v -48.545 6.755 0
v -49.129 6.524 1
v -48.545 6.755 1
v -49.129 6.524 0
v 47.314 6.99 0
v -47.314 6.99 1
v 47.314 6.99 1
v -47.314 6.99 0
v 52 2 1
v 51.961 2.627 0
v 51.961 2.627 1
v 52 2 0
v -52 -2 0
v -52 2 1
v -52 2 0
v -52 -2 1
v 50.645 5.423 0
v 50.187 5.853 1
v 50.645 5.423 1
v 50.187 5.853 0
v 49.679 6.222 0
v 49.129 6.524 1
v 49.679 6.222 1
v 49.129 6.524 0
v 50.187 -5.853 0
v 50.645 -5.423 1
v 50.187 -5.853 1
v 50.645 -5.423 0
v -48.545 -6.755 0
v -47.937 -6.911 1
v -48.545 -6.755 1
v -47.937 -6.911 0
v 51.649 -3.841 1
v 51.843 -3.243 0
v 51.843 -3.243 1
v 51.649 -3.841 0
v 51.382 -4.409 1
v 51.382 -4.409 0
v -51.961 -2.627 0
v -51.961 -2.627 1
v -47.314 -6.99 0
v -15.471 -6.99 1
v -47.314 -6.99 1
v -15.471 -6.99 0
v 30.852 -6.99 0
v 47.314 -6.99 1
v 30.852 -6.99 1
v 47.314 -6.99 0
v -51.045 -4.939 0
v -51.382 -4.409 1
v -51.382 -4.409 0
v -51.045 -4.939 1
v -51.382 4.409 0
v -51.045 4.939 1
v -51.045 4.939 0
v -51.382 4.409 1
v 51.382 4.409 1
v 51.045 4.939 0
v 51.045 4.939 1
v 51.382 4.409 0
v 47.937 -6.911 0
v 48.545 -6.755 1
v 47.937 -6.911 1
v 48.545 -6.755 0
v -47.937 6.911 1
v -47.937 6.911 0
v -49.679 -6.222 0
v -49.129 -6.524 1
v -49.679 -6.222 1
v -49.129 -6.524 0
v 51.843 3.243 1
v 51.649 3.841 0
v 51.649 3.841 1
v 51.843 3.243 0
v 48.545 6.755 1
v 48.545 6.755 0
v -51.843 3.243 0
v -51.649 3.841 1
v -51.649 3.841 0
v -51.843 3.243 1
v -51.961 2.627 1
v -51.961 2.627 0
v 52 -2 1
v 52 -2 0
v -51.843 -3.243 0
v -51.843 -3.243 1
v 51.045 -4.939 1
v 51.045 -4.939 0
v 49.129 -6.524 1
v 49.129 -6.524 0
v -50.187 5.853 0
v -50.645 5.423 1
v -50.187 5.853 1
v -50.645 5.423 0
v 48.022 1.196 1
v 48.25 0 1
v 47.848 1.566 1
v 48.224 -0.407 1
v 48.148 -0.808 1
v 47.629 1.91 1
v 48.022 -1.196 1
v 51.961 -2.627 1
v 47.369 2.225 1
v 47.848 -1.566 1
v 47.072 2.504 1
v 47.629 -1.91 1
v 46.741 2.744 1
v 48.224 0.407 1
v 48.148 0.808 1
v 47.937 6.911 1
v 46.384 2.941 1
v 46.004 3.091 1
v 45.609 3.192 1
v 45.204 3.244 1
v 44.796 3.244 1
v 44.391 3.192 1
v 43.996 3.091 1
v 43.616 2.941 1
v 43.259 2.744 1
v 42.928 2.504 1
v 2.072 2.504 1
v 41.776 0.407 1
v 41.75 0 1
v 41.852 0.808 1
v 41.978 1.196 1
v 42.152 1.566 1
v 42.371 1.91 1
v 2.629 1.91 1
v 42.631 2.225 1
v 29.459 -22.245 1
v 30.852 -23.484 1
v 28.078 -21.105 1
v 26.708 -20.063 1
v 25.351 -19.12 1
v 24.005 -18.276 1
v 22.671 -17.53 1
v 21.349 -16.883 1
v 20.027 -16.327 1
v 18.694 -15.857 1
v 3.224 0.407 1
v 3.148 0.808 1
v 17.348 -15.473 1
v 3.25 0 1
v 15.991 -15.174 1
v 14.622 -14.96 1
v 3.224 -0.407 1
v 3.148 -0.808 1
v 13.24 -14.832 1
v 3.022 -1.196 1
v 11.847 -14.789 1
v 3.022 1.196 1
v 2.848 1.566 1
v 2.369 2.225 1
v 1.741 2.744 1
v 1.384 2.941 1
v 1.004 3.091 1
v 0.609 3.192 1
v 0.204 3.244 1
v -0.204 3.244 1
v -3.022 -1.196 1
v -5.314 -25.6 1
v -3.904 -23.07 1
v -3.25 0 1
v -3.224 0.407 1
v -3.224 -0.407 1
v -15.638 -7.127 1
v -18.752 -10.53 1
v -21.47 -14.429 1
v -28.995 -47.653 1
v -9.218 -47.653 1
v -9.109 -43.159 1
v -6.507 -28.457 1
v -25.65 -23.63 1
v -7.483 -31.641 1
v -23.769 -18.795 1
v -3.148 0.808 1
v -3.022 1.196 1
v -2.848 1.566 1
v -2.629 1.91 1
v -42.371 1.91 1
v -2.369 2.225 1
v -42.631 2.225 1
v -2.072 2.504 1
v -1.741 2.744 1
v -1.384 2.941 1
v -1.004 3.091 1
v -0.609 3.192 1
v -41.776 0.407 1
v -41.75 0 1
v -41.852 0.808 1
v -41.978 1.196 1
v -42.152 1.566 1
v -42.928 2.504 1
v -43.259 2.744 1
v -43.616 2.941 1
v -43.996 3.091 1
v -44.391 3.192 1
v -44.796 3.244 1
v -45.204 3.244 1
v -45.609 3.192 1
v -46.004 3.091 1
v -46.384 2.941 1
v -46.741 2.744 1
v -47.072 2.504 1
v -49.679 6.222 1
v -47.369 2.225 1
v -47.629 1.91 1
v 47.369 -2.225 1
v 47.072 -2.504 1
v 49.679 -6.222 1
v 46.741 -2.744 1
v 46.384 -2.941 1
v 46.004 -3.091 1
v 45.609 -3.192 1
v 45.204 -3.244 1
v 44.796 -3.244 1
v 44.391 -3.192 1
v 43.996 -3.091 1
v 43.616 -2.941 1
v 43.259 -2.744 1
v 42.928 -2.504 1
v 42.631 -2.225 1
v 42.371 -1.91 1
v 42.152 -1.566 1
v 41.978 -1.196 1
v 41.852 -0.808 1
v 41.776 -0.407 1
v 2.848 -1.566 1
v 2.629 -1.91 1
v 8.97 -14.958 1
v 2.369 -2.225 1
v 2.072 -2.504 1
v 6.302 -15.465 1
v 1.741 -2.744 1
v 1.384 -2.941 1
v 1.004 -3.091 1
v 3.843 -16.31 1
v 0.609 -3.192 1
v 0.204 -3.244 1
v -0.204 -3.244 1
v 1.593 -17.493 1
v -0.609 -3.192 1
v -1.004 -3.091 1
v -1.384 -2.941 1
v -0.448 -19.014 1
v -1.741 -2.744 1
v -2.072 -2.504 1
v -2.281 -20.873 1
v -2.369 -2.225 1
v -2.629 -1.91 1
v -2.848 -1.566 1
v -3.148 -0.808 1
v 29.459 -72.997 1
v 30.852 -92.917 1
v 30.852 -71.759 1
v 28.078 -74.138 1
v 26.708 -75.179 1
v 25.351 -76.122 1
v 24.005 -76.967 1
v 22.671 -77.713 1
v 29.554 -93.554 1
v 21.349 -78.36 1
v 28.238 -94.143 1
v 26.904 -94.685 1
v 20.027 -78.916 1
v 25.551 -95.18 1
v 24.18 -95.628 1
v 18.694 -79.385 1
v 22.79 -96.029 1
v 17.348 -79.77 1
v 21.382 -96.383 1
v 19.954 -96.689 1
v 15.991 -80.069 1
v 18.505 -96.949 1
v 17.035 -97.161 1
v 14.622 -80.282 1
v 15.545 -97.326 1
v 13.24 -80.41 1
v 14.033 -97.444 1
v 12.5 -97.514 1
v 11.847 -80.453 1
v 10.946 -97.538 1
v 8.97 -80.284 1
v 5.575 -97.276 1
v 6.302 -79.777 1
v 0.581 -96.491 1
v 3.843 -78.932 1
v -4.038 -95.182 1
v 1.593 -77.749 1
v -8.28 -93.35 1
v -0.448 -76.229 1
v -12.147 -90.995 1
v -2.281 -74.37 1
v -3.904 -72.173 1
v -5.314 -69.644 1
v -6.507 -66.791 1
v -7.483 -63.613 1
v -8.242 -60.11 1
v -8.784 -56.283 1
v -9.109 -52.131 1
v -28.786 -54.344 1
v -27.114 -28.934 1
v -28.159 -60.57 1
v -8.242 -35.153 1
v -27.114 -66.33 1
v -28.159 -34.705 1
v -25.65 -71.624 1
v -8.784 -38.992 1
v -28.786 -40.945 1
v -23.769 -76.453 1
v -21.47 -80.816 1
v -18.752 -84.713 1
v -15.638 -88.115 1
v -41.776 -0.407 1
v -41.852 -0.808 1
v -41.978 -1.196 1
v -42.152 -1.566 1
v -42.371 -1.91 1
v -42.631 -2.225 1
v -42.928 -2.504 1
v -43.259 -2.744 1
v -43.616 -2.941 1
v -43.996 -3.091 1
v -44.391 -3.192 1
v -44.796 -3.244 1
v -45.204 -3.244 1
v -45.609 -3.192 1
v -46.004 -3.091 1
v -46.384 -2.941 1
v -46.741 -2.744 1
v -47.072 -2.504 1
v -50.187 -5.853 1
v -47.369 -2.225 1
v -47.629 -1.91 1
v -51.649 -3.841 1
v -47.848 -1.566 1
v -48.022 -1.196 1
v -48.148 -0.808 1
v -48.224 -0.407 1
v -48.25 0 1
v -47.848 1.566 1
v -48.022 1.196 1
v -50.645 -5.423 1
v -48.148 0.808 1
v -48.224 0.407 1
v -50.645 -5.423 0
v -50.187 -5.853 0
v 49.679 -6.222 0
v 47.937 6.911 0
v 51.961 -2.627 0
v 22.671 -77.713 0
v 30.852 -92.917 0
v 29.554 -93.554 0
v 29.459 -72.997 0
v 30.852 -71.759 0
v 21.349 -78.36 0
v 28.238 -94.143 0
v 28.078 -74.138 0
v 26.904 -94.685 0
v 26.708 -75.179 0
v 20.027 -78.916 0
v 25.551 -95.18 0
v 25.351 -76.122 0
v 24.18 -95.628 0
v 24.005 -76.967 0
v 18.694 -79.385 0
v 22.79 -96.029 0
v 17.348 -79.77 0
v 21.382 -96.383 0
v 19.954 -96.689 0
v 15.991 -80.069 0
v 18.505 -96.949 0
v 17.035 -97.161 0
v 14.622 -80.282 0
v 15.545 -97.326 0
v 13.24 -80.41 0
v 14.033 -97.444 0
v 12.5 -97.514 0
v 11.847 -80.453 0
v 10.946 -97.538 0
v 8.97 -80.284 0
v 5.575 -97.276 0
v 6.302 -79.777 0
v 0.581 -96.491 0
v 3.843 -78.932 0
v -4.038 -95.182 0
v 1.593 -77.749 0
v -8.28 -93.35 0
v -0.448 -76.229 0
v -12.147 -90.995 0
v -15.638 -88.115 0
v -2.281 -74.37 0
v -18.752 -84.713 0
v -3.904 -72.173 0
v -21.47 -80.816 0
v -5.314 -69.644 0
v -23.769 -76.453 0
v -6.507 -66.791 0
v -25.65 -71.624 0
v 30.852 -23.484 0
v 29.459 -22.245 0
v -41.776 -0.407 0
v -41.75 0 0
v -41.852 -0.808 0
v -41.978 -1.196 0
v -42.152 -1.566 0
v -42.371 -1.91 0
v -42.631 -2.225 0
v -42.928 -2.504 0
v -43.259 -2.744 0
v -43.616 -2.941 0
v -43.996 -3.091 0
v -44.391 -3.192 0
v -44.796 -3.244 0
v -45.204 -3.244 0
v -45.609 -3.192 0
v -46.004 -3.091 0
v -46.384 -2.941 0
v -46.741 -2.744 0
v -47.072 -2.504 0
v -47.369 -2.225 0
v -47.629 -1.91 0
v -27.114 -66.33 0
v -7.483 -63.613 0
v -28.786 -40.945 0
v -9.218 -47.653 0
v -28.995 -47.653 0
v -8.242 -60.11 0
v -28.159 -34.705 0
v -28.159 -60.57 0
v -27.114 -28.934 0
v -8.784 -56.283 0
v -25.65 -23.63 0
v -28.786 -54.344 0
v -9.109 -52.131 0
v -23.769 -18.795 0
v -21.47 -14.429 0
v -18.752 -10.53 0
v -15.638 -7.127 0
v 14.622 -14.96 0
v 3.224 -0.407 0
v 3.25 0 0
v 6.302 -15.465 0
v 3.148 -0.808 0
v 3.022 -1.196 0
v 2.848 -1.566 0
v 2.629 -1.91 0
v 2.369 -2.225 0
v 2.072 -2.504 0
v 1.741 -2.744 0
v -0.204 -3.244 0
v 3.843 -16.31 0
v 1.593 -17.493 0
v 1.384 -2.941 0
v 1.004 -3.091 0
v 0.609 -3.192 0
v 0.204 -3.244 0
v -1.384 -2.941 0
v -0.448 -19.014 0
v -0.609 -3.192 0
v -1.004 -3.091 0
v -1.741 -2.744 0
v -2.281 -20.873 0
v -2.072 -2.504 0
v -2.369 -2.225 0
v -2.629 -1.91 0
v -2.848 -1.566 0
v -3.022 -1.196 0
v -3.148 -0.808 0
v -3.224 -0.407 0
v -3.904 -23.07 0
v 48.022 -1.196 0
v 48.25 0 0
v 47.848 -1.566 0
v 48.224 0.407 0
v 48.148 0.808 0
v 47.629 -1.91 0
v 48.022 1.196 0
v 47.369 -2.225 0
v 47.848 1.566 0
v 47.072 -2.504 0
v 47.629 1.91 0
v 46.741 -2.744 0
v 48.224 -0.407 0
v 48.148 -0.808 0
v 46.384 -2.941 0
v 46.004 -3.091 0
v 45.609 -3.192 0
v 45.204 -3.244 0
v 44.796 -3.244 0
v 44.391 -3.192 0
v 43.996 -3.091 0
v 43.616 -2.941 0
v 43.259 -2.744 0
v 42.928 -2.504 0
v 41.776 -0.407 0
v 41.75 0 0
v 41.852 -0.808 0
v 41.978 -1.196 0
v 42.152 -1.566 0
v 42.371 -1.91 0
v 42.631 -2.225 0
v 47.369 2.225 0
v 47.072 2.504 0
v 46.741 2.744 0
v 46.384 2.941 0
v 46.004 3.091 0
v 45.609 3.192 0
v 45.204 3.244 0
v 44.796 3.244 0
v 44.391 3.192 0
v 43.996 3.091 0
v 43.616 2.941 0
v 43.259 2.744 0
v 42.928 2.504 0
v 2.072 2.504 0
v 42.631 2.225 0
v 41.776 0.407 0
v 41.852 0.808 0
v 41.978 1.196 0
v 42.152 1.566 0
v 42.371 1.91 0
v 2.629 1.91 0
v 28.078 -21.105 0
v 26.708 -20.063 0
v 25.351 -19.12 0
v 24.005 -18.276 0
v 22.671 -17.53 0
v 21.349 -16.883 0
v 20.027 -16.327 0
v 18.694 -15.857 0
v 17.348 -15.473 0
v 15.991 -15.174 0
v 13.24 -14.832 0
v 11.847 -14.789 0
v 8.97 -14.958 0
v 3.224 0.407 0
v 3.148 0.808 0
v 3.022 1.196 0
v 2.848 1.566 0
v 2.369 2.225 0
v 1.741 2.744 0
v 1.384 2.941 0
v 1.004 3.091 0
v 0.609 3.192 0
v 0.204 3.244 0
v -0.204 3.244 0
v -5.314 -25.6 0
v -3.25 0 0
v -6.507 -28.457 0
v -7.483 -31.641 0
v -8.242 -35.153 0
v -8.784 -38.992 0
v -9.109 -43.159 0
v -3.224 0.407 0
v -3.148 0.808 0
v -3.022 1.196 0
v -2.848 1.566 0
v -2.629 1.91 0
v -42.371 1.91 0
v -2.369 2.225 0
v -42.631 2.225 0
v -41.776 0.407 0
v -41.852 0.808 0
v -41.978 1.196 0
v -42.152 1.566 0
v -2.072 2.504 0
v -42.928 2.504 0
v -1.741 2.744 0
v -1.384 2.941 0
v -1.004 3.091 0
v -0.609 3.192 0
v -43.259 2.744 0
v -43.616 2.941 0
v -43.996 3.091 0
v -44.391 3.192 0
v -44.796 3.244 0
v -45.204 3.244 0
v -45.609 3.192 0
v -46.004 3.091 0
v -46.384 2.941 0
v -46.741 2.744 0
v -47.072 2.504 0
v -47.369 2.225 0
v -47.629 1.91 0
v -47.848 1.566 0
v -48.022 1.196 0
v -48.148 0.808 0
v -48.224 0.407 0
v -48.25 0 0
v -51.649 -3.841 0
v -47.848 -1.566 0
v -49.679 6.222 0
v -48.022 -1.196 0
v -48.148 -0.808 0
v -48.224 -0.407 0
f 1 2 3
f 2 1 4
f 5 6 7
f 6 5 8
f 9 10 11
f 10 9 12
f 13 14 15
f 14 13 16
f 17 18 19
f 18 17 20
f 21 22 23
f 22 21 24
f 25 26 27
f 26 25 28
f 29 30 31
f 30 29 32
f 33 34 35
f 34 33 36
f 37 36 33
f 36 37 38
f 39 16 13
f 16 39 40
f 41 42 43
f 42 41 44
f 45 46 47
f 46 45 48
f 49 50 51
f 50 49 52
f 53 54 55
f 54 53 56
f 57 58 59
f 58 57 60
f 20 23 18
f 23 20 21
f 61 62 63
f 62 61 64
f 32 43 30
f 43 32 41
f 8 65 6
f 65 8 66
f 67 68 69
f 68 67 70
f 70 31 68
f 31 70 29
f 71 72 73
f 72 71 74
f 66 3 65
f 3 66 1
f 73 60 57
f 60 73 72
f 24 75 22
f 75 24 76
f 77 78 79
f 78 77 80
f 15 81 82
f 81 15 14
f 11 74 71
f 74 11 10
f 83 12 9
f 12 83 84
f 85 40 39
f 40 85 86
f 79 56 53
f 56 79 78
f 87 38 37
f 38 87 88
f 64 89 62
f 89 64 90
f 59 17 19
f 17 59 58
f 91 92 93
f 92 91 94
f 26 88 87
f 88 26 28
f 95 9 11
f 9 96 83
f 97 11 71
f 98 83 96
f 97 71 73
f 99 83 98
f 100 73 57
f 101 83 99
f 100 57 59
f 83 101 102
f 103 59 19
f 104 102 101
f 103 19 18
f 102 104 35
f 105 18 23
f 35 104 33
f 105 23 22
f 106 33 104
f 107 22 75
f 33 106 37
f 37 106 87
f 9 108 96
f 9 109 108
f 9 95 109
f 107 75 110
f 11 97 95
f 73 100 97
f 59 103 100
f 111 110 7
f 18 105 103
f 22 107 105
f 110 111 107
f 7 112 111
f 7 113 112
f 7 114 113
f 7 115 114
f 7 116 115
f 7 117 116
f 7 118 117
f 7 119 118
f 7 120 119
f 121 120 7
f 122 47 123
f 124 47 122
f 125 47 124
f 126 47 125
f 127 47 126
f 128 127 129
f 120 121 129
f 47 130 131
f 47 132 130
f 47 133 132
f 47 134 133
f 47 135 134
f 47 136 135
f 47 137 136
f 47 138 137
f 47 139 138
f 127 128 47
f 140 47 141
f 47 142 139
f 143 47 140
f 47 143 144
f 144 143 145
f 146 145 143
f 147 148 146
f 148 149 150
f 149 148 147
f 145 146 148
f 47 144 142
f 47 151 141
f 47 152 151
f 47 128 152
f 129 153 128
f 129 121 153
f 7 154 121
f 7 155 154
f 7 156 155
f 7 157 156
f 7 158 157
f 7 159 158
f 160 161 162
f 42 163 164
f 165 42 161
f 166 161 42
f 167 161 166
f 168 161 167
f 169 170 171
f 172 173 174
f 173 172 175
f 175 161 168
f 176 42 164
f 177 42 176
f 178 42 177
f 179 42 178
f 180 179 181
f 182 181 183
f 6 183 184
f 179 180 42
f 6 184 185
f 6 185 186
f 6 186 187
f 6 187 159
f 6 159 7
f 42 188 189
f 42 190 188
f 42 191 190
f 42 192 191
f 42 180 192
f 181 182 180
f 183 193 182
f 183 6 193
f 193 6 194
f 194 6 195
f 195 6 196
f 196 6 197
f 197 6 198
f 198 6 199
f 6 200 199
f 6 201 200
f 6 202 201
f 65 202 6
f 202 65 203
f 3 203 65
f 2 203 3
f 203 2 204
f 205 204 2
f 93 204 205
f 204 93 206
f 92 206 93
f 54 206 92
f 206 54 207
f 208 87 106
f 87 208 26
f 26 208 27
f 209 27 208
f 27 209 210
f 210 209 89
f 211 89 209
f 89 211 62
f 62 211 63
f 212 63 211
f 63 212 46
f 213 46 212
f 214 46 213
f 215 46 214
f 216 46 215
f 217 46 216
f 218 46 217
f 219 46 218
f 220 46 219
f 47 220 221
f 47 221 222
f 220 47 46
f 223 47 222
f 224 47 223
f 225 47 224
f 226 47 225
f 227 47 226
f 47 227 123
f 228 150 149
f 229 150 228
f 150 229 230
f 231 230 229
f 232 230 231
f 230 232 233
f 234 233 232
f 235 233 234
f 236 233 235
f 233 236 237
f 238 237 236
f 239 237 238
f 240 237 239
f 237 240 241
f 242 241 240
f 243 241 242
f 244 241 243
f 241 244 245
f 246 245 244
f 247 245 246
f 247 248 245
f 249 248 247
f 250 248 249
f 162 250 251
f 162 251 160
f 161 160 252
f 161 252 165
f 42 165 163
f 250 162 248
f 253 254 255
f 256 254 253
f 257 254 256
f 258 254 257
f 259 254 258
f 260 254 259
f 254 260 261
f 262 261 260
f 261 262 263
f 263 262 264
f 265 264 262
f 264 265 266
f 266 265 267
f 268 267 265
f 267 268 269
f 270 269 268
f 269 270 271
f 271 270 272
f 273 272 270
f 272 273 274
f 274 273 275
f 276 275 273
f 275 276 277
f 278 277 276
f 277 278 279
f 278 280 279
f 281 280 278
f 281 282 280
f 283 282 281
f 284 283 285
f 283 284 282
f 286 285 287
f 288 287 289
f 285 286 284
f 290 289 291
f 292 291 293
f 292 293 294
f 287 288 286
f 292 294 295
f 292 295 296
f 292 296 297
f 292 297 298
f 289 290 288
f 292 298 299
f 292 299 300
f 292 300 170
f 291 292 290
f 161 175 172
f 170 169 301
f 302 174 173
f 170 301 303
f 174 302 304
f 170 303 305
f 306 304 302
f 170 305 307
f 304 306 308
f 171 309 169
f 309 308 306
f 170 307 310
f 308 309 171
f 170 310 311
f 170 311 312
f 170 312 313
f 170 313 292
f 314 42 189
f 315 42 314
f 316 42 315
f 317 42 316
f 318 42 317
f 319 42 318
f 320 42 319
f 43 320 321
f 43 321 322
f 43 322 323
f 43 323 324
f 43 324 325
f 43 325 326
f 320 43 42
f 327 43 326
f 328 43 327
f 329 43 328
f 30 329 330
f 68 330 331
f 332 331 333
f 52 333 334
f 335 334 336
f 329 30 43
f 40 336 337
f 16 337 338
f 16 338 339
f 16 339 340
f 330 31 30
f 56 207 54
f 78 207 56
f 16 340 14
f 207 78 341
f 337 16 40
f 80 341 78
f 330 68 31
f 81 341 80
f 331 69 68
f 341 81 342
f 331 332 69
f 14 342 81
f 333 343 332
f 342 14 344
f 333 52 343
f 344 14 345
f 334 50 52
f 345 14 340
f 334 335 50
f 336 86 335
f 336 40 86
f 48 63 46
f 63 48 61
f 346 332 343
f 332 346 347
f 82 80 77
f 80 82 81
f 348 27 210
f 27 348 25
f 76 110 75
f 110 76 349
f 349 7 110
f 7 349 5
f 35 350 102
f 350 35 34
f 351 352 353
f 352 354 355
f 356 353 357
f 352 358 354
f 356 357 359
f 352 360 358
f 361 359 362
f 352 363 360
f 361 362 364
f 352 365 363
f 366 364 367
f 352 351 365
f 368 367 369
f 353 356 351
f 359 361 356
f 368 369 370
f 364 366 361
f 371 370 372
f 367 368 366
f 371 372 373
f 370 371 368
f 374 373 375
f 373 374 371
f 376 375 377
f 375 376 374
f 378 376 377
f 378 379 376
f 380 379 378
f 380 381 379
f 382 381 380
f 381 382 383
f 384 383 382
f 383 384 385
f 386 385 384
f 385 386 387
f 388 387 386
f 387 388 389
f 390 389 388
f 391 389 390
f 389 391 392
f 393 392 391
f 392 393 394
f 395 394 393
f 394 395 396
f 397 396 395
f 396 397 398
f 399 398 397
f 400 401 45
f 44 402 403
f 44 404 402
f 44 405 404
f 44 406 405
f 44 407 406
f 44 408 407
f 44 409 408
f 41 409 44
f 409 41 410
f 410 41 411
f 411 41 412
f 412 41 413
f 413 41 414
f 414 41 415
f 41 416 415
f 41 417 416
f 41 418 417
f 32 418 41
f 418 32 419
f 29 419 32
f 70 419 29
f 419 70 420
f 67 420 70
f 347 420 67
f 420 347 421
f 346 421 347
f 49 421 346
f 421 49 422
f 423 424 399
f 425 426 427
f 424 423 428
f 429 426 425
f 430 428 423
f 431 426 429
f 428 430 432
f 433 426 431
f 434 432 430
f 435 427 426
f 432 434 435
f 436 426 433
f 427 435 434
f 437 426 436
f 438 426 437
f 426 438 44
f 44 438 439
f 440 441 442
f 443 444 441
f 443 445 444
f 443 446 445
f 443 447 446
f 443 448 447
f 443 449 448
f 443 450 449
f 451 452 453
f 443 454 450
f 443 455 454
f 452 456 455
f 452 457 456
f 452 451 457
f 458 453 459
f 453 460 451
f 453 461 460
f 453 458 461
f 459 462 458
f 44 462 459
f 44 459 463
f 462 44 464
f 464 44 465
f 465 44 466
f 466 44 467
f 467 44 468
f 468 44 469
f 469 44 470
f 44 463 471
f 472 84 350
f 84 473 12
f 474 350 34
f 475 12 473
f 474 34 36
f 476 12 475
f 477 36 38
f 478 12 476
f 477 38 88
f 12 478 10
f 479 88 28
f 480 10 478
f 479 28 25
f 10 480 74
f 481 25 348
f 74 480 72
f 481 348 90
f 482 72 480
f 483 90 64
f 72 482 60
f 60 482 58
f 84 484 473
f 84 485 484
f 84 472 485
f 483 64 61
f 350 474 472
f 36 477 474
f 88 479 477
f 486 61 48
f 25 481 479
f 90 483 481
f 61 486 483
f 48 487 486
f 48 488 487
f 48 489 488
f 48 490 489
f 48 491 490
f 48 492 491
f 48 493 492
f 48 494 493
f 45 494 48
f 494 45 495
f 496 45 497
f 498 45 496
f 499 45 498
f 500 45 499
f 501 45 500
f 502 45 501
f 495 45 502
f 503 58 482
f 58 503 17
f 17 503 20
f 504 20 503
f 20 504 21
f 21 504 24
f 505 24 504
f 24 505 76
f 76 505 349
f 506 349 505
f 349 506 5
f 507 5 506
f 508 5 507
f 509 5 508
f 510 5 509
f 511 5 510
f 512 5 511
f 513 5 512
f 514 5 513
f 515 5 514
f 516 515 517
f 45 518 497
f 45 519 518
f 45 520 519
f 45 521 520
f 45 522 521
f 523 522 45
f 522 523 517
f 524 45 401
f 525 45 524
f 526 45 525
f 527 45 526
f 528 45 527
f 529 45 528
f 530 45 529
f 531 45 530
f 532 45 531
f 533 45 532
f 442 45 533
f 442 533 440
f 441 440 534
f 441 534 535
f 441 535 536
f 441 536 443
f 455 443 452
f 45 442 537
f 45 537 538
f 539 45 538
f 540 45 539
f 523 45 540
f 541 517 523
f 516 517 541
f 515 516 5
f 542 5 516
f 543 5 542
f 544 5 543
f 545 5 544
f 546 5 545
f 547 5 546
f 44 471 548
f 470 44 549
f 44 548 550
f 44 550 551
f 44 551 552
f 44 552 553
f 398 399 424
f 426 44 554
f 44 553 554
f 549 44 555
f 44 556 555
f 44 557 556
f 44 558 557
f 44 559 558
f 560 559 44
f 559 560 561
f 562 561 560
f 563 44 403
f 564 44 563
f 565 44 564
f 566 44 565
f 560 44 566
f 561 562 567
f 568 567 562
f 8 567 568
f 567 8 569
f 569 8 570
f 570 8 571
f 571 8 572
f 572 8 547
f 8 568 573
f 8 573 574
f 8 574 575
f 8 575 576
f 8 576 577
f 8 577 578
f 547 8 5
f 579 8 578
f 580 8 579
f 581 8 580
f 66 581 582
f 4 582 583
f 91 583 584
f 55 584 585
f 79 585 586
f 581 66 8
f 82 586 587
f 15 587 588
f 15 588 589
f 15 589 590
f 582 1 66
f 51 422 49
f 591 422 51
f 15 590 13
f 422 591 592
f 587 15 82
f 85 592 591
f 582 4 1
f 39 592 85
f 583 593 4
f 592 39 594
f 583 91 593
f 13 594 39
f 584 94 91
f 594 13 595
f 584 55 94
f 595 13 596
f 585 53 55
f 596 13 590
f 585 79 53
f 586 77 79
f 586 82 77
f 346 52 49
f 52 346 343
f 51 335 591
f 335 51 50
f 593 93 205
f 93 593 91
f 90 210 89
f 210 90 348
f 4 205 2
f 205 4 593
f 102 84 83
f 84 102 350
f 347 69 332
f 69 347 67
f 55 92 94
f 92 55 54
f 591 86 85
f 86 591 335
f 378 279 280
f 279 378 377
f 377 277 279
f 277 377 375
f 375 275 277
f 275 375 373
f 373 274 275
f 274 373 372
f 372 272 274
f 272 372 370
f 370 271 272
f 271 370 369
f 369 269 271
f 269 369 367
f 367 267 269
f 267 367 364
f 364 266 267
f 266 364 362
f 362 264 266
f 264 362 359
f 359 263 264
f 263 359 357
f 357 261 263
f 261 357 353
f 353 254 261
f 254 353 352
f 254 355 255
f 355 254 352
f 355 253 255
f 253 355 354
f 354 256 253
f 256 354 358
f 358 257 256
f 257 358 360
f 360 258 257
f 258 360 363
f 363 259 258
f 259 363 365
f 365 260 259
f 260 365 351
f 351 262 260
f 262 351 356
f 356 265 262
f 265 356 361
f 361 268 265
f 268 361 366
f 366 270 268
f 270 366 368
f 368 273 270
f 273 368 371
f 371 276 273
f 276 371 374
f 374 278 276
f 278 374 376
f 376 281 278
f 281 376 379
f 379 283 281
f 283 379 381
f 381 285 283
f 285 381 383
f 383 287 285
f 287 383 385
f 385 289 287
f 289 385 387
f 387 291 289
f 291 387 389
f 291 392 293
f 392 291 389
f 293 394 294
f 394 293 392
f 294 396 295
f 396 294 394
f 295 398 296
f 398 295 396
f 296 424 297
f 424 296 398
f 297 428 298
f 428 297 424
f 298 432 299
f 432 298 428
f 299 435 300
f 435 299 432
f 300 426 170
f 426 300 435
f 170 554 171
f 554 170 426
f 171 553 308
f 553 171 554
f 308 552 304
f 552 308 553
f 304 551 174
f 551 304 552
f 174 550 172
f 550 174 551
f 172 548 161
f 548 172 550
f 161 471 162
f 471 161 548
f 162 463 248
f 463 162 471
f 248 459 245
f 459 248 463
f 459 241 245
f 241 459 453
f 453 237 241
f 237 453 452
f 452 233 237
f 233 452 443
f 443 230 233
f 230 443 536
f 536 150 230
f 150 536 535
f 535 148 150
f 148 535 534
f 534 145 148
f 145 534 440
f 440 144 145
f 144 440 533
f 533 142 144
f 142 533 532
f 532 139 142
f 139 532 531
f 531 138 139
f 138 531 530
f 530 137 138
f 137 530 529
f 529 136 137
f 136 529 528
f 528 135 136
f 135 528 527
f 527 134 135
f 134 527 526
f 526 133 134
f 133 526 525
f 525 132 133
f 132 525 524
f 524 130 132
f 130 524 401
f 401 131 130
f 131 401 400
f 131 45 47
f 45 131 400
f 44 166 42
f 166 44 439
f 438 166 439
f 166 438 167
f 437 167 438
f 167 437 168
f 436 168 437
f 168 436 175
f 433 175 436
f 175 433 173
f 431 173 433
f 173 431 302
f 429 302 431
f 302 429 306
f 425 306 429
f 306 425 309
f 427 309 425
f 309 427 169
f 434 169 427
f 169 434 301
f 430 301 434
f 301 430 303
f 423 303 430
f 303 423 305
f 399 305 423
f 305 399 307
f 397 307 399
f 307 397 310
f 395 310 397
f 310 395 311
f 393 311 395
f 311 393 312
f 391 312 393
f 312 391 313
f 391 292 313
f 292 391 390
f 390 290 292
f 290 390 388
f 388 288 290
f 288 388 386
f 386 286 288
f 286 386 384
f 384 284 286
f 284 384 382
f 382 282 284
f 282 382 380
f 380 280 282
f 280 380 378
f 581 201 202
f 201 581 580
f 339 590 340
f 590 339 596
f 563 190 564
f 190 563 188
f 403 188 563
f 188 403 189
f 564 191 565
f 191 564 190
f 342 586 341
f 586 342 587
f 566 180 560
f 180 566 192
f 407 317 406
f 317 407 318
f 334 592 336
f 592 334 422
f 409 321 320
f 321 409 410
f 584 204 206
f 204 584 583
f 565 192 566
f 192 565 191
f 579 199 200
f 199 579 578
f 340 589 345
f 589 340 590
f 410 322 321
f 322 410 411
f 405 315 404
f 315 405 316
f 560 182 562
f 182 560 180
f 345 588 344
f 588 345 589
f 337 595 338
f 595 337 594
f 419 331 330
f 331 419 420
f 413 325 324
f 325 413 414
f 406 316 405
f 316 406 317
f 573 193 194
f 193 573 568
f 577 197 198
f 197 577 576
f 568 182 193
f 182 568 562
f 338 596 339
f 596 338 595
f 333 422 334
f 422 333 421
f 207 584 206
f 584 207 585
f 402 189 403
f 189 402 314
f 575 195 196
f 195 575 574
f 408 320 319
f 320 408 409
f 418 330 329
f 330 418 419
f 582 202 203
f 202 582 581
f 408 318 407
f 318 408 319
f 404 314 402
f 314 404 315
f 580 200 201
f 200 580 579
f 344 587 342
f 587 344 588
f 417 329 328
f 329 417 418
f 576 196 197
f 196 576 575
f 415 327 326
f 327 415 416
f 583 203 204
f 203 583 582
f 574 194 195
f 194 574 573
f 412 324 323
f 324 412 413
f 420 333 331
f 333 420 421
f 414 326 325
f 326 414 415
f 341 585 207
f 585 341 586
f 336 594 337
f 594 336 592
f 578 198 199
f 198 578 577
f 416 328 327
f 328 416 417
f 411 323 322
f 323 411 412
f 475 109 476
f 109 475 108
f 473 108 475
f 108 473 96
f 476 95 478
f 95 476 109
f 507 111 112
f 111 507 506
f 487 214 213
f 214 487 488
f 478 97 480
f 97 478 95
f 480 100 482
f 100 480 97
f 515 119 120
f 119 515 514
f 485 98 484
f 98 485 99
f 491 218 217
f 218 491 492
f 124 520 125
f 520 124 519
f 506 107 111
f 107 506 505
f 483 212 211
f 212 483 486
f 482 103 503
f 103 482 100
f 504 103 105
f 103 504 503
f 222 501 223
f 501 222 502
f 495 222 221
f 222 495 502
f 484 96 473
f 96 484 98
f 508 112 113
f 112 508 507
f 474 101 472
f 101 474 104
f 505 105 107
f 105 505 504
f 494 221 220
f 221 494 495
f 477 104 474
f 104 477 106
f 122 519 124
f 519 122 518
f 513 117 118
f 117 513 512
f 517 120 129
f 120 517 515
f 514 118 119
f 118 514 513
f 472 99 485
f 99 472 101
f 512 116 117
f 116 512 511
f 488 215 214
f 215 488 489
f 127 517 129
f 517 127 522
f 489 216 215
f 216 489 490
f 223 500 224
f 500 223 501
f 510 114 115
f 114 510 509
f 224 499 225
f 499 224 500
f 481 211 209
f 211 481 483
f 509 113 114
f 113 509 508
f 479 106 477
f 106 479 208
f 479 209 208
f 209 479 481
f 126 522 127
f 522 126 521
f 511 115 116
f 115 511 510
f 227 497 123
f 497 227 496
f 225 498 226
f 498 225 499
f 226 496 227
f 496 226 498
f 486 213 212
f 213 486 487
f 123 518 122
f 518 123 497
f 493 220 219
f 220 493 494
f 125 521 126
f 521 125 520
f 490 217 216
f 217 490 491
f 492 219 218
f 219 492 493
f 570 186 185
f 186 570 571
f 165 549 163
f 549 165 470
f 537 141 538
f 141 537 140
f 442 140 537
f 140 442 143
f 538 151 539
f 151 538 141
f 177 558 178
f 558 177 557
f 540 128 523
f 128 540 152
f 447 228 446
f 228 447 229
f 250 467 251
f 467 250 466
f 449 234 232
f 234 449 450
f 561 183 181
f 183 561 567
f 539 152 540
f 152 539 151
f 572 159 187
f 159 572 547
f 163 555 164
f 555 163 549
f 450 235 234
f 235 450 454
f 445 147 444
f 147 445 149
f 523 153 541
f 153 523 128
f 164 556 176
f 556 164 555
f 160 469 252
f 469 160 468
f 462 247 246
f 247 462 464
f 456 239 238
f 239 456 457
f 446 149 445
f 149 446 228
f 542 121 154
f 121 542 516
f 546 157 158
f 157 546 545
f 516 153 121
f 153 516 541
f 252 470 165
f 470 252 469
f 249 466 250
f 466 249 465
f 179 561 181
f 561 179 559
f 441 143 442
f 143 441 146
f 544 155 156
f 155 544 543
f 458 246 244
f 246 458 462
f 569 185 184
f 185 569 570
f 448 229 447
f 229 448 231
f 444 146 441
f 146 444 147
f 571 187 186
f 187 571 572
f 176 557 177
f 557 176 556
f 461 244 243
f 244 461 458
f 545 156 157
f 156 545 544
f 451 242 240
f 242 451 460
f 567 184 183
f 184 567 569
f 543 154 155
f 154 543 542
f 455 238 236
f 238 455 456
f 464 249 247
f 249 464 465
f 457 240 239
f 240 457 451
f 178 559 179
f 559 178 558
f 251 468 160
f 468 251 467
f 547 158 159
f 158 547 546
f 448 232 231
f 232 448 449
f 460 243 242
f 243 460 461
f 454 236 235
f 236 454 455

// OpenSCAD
$fn = 50;


difference() {
	union() {
		translate(v = [0, 0, 0]) {
			rotate(a = [0, 0, 0]) {
				hull() {
					translate(v = [-47.0000000000, 2.0000000000, 0]) {
						rotate(a = [0, 0, 0]) {
							translate(v = [0, 0, 0]) {
								rotate(a = [0, 0, 0]) {
									cylinder(h = 1, r = 5);
								}
							}
						}
					}
					translate(v = [47.0000000000, 2.0000000000, 0]) {
						rotate(a = [0, 0, 0]) {
							translate(v = [0, 0, 0]) {
								rotate(a = [0, 0, 0]) {
									cylinder(h = 1, r = 5);
								}
							}
						}
					}
					translate(v = [-47.0000000000, -2.0000000000, 0]) {
						rotate(a = [0, 0, 0]) {
							translate(v = [0, 0, 0]) {
								rotate(a = [0, 0, 0]) {
									cylinder(h = 1, r = 5);
								}
							}
						}
					}
					translate(v = [47.0000000000, -2.0000000000, 0]) {
						rotate(a = [0, 0, 0]) {
							translate(v = [0, 0, 0]) {
								rotate(a = [0, 0, 0]) {
									cylinder(h = 1, r = 5);
								}
							}
						}
					}
				}
			}
		}
		translate(v = [0, 0, 0]) {
			rotate(a = [0, 0, 0]) {
				linear_extrude(height = 1) {
					text(font = "DejaVu Sans Mono:style=Bold", halign = "center", size = 95, text = "C", valign = "top");
				}
			}
		}
	}
	union() {
		translate(v = [-45.0000000000, 0.0000000000, -125.0000000000]) {
			rotate(a = [0, 0, 0]) {
				cylinder(h = 250, r = 3.2500000000);
			}
		}
		translate(v = [45.0000000000, 0.0000000000, -125.0000000000]) {
			rotate(a = [0, 0, 0]) {
				cylinder(h = 250, r = 3.2500000000);
			}
		}
		translate(v = [45.0000000000, 0.0000000000, -125.0000000000]) {
			rotate(a = [0, 0, 0]) {
				cylinder(h = 250, r = 3.2500000000);
			}
		}
		translate(v = [0, 0, -125.0000000000]) {
			rotate(a = [0, 0, 0]) {
				cylinder(h = 250, r = 3.2500000000);
			}
		}
	}
}
